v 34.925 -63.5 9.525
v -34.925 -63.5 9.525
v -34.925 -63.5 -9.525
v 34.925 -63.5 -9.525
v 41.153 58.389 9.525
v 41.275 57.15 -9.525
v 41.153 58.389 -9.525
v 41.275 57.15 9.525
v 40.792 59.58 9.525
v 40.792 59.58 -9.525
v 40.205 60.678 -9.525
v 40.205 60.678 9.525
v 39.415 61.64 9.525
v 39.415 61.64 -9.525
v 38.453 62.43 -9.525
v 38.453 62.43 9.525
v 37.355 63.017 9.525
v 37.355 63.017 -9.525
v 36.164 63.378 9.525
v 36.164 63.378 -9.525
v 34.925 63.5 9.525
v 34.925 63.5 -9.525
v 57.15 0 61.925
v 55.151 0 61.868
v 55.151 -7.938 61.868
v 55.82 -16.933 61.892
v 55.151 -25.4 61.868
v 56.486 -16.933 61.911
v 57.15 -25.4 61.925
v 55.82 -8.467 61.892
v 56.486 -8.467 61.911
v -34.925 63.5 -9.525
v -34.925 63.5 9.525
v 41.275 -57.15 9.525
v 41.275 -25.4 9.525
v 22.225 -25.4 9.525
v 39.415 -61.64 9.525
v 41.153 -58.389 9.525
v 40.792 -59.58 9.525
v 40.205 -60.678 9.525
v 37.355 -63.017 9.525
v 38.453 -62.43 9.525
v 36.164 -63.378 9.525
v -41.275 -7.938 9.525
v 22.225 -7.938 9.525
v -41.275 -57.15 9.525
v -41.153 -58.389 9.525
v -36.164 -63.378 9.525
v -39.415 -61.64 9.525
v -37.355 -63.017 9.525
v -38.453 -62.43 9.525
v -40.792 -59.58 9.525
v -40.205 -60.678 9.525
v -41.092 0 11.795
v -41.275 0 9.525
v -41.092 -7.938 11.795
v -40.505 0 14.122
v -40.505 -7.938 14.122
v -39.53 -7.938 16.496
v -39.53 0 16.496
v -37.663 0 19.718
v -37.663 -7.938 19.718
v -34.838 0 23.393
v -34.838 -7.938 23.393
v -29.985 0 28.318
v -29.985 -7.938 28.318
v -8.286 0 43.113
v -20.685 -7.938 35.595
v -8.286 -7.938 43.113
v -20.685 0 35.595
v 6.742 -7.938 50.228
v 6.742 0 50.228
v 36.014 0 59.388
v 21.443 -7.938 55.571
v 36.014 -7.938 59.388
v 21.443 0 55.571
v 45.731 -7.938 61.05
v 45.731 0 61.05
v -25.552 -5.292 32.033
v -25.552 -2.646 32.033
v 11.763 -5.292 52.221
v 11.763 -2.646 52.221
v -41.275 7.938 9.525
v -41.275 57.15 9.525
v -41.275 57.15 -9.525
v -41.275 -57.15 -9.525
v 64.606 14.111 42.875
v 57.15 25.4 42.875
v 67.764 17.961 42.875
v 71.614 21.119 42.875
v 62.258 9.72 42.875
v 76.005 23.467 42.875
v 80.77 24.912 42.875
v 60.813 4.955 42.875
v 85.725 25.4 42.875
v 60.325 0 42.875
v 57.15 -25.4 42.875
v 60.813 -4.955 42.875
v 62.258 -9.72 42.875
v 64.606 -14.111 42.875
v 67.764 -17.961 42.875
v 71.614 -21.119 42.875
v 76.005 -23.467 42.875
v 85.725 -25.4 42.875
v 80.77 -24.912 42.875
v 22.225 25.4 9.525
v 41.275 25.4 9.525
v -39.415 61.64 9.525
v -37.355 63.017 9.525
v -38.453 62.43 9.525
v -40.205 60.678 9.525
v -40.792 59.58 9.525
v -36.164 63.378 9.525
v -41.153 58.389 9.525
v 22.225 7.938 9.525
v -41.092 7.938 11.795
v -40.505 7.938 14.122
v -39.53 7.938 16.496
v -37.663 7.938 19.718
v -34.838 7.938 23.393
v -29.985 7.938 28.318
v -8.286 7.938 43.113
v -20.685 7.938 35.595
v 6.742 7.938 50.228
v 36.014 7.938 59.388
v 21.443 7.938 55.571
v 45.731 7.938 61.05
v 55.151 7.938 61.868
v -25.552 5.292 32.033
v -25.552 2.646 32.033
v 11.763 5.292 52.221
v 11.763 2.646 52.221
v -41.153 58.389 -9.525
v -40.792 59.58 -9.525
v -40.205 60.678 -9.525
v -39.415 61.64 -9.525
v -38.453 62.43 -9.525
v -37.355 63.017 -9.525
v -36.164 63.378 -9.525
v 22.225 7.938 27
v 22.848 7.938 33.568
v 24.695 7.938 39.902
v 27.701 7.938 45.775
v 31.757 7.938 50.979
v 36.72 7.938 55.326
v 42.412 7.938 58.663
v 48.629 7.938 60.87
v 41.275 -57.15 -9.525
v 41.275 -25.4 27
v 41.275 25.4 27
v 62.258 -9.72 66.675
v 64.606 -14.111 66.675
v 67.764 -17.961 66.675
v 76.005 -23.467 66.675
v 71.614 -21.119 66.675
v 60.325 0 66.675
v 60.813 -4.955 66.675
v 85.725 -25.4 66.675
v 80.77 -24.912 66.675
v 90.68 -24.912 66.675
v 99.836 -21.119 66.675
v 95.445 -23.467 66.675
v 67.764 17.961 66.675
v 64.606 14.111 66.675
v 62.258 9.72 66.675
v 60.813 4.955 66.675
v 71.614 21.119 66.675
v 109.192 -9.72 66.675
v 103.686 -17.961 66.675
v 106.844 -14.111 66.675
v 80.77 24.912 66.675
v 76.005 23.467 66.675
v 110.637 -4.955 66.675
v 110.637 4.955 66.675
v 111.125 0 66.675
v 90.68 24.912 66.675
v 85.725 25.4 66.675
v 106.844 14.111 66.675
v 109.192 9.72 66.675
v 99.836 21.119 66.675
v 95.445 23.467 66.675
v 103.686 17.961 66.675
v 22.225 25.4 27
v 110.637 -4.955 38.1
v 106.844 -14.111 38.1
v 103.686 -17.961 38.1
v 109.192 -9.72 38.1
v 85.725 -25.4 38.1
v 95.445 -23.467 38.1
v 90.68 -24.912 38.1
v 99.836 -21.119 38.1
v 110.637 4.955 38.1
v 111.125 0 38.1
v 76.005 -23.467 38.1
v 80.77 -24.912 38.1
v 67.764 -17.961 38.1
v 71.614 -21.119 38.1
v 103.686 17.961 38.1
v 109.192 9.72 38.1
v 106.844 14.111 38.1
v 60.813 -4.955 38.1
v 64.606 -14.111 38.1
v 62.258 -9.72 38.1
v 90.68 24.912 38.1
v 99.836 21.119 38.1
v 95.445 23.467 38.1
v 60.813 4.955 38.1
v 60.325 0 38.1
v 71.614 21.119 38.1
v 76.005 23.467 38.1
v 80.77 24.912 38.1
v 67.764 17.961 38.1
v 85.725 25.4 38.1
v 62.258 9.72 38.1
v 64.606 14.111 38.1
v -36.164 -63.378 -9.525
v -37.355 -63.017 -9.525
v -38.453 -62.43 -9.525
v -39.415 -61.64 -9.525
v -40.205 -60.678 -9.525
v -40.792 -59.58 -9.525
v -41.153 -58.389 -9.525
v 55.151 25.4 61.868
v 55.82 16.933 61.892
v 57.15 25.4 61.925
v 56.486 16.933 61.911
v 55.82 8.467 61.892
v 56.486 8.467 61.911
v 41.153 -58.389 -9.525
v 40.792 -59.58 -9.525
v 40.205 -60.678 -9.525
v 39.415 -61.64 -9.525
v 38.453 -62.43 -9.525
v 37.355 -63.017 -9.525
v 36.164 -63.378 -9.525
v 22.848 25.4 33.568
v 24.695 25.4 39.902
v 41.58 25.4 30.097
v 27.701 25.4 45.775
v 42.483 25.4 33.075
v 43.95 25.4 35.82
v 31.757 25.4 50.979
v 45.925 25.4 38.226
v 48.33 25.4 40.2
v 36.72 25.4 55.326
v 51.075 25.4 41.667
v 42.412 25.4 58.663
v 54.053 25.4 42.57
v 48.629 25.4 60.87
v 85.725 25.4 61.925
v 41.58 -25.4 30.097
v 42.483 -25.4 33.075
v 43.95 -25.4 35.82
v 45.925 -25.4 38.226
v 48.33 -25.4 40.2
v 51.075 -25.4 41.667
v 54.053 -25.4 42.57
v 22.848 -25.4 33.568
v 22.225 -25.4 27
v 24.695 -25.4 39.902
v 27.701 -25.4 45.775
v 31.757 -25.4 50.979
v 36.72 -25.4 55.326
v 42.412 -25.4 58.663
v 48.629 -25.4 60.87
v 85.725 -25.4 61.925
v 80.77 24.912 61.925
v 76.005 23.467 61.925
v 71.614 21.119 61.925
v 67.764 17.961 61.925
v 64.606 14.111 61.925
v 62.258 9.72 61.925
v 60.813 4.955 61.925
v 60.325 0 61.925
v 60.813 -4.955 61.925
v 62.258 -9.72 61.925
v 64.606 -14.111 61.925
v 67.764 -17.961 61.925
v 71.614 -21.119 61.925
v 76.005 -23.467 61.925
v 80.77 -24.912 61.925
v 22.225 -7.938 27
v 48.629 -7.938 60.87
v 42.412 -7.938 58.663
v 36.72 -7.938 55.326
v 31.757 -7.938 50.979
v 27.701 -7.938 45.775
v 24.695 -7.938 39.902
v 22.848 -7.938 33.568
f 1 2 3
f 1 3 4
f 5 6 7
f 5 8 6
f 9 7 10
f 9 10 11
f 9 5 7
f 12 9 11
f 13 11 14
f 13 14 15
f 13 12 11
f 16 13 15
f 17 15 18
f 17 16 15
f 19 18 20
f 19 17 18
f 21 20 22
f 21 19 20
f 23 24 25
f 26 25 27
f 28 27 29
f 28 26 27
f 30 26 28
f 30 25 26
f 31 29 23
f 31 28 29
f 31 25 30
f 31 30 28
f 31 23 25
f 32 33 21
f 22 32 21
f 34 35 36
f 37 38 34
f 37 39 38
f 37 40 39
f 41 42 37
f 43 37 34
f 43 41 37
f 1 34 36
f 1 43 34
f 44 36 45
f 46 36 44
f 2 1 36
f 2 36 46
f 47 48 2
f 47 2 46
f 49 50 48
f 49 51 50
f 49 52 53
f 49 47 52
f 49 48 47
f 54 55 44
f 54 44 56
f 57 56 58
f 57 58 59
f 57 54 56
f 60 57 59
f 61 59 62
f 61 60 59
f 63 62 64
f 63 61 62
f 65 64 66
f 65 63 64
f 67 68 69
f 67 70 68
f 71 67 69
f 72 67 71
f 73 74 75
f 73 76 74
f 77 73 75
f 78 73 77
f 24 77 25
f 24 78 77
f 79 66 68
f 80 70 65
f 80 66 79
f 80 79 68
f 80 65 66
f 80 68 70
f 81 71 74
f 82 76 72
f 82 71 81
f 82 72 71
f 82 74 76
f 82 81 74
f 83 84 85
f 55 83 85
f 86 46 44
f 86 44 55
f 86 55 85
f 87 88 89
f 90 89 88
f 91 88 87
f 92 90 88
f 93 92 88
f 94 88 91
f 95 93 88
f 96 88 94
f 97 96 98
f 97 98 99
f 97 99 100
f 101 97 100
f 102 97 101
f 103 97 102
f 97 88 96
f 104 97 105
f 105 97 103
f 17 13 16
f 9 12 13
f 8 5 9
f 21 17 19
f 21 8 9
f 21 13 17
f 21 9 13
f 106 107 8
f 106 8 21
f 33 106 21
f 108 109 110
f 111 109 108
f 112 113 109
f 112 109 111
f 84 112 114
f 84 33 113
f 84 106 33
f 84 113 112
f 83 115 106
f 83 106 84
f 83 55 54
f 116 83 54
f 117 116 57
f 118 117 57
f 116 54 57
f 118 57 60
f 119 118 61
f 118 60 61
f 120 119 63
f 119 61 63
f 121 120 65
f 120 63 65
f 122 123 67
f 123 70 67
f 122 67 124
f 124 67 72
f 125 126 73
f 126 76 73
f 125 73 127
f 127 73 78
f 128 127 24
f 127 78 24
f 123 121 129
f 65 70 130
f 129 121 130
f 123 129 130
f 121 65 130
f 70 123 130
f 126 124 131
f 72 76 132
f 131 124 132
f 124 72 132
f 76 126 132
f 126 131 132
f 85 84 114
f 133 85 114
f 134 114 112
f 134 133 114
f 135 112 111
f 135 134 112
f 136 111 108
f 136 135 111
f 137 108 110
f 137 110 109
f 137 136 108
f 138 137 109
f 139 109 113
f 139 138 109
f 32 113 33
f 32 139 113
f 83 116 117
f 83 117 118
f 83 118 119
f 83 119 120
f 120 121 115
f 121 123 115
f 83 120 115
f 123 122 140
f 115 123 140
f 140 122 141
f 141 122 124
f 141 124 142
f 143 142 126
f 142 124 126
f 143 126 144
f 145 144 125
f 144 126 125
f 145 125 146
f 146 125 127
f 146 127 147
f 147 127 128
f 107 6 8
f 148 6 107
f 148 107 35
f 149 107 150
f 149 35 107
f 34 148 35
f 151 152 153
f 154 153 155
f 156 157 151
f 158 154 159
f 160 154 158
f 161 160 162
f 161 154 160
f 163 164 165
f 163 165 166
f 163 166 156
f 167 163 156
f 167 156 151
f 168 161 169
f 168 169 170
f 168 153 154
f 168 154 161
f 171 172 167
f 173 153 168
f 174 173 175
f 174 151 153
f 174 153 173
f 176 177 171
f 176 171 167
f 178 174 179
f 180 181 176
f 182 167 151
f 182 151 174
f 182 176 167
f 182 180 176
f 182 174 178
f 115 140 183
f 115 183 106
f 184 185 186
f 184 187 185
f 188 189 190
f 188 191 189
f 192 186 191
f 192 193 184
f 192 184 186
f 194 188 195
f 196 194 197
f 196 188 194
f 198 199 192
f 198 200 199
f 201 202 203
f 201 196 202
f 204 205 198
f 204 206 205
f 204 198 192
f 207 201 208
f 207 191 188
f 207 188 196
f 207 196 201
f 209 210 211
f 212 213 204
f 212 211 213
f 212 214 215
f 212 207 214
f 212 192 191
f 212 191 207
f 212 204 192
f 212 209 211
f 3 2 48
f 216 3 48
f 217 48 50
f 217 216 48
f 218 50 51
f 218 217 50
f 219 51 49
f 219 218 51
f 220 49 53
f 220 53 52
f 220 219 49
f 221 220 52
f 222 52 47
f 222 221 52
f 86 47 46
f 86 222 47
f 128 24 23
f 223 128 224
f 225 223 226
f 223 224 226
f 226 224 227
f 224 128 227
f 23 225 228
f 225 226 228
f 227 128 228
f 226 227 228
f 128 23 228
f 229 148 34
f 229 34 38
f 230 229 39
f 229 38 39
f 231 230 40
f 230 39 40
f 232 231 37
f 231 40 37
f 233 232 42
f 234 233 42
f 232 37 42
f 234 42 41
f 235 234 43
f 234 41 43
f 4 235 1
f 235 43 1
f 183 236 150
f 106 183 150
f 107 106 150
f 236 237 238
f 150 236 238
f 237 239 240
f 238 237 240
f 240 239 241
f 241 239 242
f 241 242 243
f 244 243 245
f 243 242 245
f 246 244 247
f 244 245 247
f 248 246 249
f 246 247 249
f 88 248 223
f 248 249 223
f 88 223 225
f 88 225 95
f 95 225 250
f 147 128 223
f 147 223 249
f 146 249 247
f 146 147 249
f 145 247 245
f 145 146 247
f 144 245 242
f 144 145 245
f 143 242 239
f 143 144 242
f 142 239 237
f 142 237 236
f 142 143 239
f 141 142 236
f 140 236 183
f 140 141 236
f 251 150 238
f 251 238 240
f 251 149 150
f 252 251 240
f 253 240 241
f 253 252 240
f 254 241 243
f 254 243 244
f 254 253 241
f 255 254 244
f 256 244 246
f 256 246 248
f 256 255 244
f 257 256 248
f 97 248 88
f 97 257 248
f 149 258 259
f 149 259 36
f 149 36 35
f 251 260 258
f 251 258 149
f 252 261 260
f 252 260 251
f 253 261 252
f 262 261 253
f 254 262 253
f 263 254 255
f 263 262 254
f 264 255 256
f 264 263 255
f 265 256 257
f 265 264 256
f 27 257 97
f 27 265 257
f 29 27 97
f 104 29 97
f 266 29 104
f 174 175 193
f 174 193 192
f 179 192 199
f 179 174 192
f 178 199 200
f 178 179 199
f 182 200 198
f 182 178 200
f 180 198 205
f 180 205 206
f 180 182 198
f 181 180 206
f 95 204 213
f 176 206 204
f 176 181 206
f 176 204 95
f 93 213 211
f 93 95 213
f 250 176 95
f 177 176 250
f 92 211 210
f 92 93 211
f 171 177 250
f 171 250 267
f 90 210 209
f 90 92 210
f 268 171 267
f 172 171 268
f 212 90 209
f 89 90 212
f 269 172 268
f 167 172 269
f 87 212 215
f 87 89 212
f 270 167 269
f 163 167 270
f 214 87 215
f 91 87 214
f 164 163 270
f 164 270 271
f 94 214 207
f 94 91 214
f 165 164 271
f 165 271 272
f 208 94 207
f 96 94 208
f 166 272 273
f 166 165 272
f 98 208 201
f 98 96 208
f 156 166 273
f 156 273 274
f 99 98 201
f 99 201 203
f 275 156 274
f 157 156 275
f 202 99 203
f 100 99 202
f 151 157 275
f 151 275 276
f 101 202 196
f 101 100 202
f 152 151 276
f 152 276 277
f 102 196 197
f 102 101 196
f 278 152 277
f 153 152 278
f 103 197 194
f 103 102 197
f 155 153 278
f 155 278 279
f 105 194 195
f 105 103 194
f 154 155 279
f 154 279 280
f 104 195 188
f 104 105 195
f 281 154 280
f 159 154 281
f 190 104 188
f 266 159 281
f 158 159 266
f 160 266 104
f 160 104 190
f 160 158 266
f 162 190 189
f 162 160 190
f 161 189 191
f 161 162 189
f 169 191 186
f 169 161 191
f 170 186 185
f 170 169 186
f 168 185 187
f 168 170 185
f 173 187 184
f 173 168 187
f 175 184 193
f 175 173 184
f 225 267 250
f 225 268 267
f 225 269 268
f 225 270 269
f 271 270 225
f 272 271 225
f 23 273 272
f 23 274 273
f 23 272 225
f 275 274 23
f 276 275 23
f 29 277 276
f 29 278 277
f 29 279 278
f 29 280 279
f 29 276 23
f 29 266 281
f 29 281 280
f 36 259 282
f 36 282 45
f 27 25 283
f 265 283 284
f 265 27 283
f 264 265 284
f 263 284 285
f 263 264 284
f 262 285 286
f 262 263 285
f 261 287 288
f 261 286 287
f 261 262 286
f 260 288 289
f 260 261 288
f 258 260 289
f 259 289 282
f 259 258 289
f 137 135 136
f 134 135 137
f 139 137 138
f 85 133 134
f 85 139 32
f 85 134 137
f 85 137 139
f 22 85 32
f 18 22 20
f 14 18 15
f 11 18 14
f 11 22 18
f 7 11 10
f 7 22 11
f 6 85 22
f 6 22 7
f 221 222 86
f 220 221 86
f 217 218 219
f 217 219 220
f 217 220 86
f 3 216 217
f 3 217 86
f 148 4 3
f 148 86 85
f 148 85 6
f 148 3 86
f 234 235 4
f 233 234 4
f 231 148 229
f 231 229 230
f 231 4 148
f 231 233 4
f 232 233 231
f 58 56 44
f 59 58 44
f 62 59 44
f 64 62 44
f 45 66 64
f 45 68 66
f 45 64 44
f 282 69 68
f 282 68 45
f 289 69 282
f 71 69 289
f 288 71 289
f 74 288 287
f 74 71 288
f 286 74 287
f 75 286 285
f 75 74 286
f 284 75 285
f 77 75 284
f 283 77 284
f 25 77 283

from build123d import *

# Parameters (mm, degrees)
F1_DEPTH = 63.5
F0_W     = 25.4
F0_H     = 19.05
F2_DEPTH = 25.4
F3_DEPTH = 7.9375
F5_R     = 6.35


with BuildPart() as f1:
    # F0 (on Front) → F1 (new body, symmetric)
    with BuildSketch(Plane.XZ):
        Polygon((41.275, -9.525), (41.275, 9.525), (22.225, 9.525), (-41.275, 9.525), (-41.275, -9.525), align=None)
    extrude(amount=F1_DEPTH, both=True)

    # F0 (on Front) → F2 (join, symmetric)
    with BuildSketch(Plane.XZ):
        with BuildLine():
            Line((57.15, 42.8752), (60.325, 42.8752))
            Line((60.325, 42.8752), (60.325, 61.9252))
            Line((60.325, 61.9252), (57.15, 61.9252))
            add(Edge.make_bspline(
                [(55.1509005081, 61.8679390466), (55.8211077358, 61.8945082476), (56.4875740772, 61.9136481218), (57.15, 61.9252)],
                knots=[109.7218611873, 109.7218611873, 109.7218611873, 109.7218611873, 111.5045361635, 111.5045361635, 111.5045361635, 111.5045361635], degree=3))
            ThreePointArc((55.1509005081, 61.8679390466), (31.7573418607, 50.9787015717), (22.225, 27.0002))
            Line((22.225, 27.0002), (22.225, 9.525))
            Line((22.225, 9.525), (41.275, 9.525))
            Line((41.275, 9.525), (41.275, 27.0002))
            ThreePointArc((41.275, 27.0002), (45.9246798487, 38.2255201513), (57.15, 42.8752))
        make_face()
        with Locations((73.025, 52.4002)):
            Rectangle(F0_W, F0_H)
    extrude(amount=F2_DEPTH, both=True)

    # F0 (on Front) → F3 (join, symmetric)
    with BuildSketch(Plane.XZ):
        with BuildLine():
            ThreePointArc((22.225, 27.0002), (31.7573418607, 50.9787015717), (55.1509005081, 61.8679390466))
            add(Edge.make_bspline(
                [(-41.275, 9.525), (-41.5217901281, 30.4529584249), (13.9003161981, 60.2326313083), (55.1509005081, 61.8679390466)],
                knots=[0, 0, 0, 0, 109.7218611873, 109.7218611873, 109.7218611873, 109.7218611873], degree=3))
            Line((-41.275, 9.525), (22.225, 9.525))
            Line((22.225, 9.525), (22.225, 27.0002))
        make_face()
    extrude(amount=F3_DEPTH, both=True)

    # F0 (on Front) → F4 (revolve)
    with BuildSketch(Plane.XZ):
        Polygon((85.725, 38.1), (111.125, 38.1), (111.125, 66.675), (85.725, 66.675), (85.725, 61.9252), (85.725, 42.8752), align=None)
    revolve(axis=Axis((85.725, 0, 52.3875), (0, 0, 1)))

    # F5
    f5_edges = [f1.edges().sort_by_distance(p)[0] for p in [
        (41.275, -63.5, 0),
        (-41.275, -63.5, 0),
        (41.275, 63.5, 0),
        (-41.275, 63.5, 0),
    ]]
    fillet(f5_edges, radius=F5_R)


solid = f1.part
